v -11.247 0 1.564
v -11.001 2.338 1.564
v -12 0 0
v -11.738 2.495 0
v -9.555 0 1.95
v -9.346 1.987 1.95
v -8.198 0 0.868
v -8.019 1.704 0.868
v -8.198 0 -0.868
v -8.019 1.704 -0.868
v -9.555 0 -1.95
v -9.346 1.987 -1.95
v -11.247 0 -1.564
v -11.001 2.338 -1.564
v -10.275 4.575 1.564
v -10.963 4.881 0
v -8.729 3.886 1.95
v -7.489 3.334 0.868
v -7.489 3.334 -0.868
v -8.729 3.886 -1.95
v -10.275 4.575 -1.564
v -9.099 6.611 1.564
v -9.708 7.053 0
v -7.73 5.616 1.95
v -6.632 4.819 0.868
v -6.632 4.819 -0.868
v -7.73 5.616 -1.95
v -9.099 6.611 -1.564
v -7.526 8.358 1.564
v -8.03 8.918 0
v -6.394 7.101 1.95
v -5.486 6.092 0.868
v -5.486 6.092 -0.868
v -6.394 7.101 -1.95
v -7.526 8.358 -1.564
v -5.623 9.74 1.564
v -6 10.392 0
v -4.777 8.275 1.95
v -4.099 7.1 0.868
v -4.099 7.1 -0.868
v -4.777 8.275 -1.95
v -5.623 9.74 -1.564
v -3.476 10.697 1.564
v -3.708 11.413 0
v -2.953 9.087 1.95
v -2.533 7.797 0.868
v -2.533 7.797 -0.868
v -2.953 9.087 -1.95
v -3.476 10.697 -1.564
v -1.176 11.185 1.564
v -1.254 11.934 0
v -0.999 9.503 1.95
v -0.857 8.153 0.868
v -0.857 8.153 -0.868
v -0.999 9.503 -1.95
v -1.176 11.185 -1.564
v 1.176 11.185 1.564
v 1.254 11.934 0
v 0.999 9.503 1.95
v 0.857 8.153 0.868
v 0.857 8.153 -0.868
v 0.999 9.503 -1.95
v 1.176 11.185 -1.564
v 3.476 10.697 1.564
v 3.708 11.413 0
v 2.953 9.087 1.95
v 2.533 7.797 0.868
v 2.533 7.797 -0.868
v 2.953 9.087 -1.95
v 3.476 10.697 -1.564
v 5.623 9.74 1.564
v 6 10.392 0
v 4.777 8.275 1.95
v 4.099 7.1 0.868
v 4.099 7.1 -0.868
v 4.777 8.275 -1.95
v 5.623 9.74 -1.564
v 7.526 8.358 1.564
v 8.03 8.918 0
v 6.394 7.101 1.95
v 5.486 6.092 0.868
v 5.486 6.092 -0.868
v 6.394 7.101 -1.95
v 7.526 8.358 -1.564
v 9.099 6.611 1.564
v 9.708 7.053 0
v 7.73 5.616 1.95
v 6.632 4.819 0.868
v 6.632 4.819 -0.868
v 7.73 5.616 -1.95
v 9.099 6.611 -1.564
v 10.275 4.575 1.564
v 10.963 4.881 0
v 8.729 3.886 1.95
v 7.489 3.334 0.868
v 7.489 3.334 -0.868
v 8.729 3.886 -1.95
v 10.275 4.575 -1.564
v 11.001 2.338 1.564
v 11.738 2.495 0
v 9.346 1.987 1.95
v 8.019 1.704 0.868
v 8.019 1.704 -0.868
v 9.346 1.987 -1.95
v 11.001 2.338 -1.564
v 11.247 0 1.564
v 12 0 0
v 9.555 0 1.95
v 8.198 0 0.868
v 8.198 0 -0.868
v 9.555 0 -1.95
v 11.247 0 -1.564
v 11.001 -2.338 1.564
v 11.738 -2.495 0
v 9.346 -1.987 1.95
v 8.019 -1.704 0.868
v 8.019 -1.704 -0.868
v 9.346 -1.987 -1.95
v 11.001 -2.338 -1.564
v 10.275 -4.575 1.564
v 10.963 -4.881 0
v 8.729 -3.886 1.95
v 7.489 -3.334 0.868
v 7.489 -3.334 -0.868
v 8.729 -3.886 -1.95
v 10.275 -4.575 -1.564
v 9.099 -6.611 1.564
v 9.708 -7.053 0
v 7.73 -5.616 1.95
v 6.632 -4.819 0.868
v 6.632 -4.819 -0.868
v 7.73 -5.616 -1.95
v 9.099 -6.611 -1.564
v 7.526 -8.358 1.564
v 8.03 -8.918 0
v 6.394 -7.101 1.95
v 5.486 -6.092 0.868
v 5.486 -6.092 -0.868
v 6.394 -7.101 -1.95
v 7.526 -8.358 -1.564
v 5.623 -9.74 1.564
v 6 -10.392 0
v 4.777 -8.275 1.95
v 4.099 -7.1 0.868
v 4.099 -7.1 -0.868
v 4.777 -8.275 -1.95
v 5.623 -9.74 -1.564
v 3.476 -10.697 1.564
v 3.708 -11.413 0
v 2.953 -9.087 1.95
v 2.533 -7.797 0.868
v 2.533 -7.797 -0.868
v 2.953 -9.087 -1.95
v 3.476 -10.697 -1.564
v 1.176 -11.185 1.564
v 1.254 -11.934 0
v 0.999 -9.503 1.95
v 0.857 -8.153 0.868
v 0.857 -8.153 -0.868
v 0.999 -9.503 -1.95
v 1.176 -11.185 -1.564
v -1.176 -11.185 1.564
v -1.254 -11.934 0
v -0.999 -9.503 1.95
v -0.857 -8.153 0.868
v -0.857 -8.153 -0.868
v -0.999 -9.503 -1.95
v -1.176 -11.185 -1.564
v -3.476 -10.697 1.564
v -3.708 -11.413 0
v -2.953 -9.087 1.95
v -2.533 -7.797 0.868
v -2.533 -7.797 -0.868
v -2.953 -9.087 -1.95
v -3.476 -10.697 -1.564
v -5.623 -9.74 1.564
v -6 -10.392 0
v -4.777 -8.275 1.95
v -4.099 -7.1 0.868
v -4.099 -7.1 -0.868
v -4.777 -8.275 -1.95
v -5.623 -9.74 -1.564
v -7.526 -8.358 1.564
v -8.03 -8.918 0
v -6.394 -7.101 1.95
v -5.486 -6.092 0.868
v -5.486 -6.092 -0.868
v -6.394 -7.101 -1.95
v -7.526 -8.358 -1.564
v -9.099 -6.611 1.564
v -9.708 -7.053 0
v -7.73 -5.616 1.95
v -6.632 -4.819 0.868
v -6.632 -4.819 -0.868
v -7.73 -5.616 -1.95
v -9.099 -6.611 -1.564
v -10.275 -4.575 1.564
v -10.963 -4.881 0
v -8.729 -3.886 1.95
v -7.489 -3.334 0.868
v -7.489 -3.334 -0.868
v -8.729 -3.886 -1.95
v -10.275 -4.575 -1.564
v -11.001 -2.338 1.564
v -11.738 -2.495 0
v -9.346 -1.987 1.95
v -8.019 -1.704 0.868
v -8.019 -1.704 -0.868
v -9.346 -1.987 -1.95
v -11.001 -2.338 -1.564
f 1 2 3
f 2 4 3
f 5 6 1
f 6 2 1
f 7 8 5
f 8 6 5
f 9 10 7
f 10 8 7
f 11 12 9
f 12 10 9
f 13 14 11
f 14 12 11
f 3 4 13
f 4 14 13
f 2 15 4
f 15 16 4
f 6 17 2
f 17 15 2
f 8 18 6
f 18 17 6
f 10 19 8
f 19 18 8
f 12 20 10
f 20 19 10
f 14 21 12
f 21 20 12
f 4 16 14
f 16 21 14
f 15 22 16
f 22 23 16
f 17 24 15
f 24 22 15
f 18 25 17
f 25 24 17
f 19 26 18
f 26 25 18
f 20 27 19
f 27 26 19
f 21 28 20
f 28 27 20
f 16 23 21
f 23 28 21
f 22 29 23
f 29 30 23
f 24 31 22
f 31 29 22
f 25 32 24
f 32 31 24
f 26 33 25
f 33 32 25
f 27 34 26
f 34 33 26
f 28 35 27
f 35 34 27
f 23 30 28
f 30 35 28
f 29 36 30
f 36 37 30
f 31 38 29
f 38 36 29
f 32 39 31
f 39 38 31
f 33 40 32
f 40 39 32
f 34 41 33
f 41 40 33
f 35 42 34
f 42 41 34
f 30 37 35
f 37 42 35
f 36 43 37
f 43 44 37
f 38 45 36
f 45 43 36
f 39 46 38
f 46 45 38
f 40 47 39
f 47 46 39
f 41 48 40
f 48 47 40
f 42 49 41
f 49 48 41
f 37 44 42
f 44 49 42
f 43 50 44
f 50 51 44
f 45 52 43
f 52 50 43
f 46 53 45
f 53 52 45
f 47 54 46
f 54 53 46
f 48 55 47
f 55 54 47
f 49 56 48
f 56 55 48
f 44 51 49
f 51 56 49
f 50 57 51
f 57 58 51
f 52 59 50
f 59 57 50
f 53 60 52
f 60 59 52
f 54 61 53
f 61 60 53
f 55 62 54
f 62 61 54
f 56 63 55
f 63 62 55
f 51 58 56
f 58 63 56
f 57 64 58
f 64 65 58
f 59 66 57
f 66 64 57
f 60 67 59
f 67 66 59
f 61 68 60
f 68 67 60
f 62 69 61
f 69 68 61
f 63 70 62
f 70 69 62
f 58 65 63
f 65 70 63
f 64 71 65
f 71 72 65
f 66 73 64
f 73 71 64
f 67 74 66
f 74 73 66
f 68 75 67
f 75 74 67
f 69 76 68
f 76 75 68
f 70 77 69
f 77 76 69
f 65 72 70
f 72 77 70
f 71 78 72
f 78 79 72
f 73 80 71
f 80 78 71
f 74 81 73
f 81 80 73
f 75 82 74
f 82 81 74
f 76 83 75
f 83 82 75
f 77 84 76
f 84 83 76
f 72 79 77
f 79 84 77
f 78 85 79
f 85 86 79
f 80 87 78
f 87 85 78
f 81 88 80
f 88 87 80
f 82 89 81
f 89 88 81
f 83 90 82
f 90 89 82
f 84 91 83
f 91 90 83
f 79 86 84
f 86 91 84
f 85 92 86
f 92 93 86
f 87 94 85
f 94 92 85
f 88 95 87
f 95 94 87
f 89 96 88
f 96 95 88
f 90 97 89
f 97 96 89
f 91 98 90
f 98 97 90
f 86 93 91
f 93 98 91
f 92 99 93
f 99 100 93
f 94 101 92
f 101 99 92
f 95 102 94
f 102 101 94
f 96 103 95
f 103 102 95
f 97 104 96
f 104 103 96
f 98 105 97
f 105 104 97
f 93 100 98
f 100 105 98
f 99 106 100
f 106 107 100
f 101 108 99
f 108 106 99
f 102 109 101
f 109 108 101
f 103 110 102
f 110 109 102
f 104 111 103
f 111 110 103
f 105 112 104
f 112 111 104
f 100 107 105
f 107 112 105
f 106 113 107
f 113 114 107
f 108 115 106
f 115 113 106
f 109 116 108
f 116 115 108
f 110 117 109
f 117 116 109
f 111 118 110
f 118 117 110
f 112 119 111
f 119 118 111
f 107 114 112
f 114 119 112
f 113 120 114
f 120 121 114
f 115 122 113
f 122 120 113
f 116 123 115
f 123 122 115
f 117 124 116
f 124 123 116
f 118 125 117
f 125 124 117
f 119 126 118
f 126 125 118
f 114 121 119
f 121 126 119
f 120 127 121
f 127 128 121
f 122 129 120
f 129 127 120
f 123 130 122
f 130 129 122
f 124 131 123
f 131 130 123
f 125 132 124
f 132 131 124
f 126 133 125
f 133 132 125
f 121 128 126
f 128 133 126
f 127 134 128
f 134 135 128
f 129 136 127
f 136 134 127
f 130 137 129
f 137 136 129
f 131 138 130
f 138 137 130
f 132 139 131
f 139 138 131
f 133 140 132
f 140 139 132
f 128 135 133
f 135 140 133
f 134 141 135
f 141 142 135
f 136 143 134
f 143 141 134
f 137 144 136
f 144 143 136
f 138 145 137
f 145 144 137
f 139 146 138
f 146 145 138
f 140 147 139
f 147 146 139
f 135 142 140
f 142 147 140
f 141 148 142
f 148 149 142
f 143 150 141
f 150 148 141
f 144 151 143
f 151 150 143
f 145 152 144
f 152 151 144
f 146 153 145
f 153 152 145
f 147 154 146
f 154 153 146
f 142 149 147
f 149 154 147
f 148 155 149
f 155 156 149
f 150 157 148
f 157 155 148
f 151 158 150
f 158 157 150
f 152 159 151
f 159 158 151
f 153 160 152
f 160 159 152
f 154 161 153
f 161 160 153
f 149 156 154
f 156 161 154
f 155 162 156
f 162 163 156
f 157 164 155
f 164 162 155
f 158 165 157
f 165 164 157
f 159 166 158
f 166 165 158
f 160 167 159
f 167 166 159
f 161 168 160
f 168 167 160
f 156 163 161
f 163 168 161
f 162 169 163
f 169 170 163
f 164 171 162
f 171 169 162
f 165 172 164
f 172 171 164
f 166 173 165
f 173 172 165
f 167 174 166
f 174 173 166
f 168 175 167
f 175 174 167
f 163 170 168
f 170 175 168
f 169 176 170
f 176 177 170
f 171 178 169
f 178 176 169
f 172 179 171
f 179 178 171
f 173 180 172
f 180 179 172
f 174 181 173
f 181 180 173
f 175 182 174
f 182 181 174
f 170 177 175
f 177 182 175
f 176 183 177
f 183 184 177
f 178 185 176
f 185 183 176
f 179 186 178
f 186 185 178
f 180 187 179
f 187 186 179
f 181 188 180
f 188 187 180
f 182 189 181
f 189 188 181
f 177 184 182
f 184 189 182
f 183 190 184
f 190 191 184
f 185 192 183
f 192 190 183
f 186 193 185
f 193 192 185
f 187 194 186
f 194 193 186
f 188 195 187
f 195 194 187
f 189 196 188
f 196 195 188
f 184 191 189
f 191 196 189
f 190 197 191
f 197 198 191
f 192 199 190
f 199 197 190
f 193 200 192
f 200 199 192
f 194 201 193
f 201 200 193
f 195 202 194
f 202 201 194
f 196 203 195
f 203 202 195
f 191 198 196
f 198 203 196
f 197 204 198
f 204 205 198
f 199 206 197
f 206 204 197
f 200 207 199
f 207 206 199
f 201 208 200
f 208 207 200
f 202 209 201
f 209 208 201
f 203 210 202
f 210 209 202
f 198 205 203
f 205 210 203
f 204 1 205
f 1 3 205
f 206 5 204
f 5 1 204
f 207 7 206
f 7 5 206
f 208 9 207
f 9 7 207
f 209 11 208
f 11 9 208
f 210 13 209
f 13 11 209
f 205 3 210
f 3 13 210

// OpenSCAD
r1 = 10;
r2 = 2;

rotate_extrude() translate([r1,0,0]) circle(r2);
